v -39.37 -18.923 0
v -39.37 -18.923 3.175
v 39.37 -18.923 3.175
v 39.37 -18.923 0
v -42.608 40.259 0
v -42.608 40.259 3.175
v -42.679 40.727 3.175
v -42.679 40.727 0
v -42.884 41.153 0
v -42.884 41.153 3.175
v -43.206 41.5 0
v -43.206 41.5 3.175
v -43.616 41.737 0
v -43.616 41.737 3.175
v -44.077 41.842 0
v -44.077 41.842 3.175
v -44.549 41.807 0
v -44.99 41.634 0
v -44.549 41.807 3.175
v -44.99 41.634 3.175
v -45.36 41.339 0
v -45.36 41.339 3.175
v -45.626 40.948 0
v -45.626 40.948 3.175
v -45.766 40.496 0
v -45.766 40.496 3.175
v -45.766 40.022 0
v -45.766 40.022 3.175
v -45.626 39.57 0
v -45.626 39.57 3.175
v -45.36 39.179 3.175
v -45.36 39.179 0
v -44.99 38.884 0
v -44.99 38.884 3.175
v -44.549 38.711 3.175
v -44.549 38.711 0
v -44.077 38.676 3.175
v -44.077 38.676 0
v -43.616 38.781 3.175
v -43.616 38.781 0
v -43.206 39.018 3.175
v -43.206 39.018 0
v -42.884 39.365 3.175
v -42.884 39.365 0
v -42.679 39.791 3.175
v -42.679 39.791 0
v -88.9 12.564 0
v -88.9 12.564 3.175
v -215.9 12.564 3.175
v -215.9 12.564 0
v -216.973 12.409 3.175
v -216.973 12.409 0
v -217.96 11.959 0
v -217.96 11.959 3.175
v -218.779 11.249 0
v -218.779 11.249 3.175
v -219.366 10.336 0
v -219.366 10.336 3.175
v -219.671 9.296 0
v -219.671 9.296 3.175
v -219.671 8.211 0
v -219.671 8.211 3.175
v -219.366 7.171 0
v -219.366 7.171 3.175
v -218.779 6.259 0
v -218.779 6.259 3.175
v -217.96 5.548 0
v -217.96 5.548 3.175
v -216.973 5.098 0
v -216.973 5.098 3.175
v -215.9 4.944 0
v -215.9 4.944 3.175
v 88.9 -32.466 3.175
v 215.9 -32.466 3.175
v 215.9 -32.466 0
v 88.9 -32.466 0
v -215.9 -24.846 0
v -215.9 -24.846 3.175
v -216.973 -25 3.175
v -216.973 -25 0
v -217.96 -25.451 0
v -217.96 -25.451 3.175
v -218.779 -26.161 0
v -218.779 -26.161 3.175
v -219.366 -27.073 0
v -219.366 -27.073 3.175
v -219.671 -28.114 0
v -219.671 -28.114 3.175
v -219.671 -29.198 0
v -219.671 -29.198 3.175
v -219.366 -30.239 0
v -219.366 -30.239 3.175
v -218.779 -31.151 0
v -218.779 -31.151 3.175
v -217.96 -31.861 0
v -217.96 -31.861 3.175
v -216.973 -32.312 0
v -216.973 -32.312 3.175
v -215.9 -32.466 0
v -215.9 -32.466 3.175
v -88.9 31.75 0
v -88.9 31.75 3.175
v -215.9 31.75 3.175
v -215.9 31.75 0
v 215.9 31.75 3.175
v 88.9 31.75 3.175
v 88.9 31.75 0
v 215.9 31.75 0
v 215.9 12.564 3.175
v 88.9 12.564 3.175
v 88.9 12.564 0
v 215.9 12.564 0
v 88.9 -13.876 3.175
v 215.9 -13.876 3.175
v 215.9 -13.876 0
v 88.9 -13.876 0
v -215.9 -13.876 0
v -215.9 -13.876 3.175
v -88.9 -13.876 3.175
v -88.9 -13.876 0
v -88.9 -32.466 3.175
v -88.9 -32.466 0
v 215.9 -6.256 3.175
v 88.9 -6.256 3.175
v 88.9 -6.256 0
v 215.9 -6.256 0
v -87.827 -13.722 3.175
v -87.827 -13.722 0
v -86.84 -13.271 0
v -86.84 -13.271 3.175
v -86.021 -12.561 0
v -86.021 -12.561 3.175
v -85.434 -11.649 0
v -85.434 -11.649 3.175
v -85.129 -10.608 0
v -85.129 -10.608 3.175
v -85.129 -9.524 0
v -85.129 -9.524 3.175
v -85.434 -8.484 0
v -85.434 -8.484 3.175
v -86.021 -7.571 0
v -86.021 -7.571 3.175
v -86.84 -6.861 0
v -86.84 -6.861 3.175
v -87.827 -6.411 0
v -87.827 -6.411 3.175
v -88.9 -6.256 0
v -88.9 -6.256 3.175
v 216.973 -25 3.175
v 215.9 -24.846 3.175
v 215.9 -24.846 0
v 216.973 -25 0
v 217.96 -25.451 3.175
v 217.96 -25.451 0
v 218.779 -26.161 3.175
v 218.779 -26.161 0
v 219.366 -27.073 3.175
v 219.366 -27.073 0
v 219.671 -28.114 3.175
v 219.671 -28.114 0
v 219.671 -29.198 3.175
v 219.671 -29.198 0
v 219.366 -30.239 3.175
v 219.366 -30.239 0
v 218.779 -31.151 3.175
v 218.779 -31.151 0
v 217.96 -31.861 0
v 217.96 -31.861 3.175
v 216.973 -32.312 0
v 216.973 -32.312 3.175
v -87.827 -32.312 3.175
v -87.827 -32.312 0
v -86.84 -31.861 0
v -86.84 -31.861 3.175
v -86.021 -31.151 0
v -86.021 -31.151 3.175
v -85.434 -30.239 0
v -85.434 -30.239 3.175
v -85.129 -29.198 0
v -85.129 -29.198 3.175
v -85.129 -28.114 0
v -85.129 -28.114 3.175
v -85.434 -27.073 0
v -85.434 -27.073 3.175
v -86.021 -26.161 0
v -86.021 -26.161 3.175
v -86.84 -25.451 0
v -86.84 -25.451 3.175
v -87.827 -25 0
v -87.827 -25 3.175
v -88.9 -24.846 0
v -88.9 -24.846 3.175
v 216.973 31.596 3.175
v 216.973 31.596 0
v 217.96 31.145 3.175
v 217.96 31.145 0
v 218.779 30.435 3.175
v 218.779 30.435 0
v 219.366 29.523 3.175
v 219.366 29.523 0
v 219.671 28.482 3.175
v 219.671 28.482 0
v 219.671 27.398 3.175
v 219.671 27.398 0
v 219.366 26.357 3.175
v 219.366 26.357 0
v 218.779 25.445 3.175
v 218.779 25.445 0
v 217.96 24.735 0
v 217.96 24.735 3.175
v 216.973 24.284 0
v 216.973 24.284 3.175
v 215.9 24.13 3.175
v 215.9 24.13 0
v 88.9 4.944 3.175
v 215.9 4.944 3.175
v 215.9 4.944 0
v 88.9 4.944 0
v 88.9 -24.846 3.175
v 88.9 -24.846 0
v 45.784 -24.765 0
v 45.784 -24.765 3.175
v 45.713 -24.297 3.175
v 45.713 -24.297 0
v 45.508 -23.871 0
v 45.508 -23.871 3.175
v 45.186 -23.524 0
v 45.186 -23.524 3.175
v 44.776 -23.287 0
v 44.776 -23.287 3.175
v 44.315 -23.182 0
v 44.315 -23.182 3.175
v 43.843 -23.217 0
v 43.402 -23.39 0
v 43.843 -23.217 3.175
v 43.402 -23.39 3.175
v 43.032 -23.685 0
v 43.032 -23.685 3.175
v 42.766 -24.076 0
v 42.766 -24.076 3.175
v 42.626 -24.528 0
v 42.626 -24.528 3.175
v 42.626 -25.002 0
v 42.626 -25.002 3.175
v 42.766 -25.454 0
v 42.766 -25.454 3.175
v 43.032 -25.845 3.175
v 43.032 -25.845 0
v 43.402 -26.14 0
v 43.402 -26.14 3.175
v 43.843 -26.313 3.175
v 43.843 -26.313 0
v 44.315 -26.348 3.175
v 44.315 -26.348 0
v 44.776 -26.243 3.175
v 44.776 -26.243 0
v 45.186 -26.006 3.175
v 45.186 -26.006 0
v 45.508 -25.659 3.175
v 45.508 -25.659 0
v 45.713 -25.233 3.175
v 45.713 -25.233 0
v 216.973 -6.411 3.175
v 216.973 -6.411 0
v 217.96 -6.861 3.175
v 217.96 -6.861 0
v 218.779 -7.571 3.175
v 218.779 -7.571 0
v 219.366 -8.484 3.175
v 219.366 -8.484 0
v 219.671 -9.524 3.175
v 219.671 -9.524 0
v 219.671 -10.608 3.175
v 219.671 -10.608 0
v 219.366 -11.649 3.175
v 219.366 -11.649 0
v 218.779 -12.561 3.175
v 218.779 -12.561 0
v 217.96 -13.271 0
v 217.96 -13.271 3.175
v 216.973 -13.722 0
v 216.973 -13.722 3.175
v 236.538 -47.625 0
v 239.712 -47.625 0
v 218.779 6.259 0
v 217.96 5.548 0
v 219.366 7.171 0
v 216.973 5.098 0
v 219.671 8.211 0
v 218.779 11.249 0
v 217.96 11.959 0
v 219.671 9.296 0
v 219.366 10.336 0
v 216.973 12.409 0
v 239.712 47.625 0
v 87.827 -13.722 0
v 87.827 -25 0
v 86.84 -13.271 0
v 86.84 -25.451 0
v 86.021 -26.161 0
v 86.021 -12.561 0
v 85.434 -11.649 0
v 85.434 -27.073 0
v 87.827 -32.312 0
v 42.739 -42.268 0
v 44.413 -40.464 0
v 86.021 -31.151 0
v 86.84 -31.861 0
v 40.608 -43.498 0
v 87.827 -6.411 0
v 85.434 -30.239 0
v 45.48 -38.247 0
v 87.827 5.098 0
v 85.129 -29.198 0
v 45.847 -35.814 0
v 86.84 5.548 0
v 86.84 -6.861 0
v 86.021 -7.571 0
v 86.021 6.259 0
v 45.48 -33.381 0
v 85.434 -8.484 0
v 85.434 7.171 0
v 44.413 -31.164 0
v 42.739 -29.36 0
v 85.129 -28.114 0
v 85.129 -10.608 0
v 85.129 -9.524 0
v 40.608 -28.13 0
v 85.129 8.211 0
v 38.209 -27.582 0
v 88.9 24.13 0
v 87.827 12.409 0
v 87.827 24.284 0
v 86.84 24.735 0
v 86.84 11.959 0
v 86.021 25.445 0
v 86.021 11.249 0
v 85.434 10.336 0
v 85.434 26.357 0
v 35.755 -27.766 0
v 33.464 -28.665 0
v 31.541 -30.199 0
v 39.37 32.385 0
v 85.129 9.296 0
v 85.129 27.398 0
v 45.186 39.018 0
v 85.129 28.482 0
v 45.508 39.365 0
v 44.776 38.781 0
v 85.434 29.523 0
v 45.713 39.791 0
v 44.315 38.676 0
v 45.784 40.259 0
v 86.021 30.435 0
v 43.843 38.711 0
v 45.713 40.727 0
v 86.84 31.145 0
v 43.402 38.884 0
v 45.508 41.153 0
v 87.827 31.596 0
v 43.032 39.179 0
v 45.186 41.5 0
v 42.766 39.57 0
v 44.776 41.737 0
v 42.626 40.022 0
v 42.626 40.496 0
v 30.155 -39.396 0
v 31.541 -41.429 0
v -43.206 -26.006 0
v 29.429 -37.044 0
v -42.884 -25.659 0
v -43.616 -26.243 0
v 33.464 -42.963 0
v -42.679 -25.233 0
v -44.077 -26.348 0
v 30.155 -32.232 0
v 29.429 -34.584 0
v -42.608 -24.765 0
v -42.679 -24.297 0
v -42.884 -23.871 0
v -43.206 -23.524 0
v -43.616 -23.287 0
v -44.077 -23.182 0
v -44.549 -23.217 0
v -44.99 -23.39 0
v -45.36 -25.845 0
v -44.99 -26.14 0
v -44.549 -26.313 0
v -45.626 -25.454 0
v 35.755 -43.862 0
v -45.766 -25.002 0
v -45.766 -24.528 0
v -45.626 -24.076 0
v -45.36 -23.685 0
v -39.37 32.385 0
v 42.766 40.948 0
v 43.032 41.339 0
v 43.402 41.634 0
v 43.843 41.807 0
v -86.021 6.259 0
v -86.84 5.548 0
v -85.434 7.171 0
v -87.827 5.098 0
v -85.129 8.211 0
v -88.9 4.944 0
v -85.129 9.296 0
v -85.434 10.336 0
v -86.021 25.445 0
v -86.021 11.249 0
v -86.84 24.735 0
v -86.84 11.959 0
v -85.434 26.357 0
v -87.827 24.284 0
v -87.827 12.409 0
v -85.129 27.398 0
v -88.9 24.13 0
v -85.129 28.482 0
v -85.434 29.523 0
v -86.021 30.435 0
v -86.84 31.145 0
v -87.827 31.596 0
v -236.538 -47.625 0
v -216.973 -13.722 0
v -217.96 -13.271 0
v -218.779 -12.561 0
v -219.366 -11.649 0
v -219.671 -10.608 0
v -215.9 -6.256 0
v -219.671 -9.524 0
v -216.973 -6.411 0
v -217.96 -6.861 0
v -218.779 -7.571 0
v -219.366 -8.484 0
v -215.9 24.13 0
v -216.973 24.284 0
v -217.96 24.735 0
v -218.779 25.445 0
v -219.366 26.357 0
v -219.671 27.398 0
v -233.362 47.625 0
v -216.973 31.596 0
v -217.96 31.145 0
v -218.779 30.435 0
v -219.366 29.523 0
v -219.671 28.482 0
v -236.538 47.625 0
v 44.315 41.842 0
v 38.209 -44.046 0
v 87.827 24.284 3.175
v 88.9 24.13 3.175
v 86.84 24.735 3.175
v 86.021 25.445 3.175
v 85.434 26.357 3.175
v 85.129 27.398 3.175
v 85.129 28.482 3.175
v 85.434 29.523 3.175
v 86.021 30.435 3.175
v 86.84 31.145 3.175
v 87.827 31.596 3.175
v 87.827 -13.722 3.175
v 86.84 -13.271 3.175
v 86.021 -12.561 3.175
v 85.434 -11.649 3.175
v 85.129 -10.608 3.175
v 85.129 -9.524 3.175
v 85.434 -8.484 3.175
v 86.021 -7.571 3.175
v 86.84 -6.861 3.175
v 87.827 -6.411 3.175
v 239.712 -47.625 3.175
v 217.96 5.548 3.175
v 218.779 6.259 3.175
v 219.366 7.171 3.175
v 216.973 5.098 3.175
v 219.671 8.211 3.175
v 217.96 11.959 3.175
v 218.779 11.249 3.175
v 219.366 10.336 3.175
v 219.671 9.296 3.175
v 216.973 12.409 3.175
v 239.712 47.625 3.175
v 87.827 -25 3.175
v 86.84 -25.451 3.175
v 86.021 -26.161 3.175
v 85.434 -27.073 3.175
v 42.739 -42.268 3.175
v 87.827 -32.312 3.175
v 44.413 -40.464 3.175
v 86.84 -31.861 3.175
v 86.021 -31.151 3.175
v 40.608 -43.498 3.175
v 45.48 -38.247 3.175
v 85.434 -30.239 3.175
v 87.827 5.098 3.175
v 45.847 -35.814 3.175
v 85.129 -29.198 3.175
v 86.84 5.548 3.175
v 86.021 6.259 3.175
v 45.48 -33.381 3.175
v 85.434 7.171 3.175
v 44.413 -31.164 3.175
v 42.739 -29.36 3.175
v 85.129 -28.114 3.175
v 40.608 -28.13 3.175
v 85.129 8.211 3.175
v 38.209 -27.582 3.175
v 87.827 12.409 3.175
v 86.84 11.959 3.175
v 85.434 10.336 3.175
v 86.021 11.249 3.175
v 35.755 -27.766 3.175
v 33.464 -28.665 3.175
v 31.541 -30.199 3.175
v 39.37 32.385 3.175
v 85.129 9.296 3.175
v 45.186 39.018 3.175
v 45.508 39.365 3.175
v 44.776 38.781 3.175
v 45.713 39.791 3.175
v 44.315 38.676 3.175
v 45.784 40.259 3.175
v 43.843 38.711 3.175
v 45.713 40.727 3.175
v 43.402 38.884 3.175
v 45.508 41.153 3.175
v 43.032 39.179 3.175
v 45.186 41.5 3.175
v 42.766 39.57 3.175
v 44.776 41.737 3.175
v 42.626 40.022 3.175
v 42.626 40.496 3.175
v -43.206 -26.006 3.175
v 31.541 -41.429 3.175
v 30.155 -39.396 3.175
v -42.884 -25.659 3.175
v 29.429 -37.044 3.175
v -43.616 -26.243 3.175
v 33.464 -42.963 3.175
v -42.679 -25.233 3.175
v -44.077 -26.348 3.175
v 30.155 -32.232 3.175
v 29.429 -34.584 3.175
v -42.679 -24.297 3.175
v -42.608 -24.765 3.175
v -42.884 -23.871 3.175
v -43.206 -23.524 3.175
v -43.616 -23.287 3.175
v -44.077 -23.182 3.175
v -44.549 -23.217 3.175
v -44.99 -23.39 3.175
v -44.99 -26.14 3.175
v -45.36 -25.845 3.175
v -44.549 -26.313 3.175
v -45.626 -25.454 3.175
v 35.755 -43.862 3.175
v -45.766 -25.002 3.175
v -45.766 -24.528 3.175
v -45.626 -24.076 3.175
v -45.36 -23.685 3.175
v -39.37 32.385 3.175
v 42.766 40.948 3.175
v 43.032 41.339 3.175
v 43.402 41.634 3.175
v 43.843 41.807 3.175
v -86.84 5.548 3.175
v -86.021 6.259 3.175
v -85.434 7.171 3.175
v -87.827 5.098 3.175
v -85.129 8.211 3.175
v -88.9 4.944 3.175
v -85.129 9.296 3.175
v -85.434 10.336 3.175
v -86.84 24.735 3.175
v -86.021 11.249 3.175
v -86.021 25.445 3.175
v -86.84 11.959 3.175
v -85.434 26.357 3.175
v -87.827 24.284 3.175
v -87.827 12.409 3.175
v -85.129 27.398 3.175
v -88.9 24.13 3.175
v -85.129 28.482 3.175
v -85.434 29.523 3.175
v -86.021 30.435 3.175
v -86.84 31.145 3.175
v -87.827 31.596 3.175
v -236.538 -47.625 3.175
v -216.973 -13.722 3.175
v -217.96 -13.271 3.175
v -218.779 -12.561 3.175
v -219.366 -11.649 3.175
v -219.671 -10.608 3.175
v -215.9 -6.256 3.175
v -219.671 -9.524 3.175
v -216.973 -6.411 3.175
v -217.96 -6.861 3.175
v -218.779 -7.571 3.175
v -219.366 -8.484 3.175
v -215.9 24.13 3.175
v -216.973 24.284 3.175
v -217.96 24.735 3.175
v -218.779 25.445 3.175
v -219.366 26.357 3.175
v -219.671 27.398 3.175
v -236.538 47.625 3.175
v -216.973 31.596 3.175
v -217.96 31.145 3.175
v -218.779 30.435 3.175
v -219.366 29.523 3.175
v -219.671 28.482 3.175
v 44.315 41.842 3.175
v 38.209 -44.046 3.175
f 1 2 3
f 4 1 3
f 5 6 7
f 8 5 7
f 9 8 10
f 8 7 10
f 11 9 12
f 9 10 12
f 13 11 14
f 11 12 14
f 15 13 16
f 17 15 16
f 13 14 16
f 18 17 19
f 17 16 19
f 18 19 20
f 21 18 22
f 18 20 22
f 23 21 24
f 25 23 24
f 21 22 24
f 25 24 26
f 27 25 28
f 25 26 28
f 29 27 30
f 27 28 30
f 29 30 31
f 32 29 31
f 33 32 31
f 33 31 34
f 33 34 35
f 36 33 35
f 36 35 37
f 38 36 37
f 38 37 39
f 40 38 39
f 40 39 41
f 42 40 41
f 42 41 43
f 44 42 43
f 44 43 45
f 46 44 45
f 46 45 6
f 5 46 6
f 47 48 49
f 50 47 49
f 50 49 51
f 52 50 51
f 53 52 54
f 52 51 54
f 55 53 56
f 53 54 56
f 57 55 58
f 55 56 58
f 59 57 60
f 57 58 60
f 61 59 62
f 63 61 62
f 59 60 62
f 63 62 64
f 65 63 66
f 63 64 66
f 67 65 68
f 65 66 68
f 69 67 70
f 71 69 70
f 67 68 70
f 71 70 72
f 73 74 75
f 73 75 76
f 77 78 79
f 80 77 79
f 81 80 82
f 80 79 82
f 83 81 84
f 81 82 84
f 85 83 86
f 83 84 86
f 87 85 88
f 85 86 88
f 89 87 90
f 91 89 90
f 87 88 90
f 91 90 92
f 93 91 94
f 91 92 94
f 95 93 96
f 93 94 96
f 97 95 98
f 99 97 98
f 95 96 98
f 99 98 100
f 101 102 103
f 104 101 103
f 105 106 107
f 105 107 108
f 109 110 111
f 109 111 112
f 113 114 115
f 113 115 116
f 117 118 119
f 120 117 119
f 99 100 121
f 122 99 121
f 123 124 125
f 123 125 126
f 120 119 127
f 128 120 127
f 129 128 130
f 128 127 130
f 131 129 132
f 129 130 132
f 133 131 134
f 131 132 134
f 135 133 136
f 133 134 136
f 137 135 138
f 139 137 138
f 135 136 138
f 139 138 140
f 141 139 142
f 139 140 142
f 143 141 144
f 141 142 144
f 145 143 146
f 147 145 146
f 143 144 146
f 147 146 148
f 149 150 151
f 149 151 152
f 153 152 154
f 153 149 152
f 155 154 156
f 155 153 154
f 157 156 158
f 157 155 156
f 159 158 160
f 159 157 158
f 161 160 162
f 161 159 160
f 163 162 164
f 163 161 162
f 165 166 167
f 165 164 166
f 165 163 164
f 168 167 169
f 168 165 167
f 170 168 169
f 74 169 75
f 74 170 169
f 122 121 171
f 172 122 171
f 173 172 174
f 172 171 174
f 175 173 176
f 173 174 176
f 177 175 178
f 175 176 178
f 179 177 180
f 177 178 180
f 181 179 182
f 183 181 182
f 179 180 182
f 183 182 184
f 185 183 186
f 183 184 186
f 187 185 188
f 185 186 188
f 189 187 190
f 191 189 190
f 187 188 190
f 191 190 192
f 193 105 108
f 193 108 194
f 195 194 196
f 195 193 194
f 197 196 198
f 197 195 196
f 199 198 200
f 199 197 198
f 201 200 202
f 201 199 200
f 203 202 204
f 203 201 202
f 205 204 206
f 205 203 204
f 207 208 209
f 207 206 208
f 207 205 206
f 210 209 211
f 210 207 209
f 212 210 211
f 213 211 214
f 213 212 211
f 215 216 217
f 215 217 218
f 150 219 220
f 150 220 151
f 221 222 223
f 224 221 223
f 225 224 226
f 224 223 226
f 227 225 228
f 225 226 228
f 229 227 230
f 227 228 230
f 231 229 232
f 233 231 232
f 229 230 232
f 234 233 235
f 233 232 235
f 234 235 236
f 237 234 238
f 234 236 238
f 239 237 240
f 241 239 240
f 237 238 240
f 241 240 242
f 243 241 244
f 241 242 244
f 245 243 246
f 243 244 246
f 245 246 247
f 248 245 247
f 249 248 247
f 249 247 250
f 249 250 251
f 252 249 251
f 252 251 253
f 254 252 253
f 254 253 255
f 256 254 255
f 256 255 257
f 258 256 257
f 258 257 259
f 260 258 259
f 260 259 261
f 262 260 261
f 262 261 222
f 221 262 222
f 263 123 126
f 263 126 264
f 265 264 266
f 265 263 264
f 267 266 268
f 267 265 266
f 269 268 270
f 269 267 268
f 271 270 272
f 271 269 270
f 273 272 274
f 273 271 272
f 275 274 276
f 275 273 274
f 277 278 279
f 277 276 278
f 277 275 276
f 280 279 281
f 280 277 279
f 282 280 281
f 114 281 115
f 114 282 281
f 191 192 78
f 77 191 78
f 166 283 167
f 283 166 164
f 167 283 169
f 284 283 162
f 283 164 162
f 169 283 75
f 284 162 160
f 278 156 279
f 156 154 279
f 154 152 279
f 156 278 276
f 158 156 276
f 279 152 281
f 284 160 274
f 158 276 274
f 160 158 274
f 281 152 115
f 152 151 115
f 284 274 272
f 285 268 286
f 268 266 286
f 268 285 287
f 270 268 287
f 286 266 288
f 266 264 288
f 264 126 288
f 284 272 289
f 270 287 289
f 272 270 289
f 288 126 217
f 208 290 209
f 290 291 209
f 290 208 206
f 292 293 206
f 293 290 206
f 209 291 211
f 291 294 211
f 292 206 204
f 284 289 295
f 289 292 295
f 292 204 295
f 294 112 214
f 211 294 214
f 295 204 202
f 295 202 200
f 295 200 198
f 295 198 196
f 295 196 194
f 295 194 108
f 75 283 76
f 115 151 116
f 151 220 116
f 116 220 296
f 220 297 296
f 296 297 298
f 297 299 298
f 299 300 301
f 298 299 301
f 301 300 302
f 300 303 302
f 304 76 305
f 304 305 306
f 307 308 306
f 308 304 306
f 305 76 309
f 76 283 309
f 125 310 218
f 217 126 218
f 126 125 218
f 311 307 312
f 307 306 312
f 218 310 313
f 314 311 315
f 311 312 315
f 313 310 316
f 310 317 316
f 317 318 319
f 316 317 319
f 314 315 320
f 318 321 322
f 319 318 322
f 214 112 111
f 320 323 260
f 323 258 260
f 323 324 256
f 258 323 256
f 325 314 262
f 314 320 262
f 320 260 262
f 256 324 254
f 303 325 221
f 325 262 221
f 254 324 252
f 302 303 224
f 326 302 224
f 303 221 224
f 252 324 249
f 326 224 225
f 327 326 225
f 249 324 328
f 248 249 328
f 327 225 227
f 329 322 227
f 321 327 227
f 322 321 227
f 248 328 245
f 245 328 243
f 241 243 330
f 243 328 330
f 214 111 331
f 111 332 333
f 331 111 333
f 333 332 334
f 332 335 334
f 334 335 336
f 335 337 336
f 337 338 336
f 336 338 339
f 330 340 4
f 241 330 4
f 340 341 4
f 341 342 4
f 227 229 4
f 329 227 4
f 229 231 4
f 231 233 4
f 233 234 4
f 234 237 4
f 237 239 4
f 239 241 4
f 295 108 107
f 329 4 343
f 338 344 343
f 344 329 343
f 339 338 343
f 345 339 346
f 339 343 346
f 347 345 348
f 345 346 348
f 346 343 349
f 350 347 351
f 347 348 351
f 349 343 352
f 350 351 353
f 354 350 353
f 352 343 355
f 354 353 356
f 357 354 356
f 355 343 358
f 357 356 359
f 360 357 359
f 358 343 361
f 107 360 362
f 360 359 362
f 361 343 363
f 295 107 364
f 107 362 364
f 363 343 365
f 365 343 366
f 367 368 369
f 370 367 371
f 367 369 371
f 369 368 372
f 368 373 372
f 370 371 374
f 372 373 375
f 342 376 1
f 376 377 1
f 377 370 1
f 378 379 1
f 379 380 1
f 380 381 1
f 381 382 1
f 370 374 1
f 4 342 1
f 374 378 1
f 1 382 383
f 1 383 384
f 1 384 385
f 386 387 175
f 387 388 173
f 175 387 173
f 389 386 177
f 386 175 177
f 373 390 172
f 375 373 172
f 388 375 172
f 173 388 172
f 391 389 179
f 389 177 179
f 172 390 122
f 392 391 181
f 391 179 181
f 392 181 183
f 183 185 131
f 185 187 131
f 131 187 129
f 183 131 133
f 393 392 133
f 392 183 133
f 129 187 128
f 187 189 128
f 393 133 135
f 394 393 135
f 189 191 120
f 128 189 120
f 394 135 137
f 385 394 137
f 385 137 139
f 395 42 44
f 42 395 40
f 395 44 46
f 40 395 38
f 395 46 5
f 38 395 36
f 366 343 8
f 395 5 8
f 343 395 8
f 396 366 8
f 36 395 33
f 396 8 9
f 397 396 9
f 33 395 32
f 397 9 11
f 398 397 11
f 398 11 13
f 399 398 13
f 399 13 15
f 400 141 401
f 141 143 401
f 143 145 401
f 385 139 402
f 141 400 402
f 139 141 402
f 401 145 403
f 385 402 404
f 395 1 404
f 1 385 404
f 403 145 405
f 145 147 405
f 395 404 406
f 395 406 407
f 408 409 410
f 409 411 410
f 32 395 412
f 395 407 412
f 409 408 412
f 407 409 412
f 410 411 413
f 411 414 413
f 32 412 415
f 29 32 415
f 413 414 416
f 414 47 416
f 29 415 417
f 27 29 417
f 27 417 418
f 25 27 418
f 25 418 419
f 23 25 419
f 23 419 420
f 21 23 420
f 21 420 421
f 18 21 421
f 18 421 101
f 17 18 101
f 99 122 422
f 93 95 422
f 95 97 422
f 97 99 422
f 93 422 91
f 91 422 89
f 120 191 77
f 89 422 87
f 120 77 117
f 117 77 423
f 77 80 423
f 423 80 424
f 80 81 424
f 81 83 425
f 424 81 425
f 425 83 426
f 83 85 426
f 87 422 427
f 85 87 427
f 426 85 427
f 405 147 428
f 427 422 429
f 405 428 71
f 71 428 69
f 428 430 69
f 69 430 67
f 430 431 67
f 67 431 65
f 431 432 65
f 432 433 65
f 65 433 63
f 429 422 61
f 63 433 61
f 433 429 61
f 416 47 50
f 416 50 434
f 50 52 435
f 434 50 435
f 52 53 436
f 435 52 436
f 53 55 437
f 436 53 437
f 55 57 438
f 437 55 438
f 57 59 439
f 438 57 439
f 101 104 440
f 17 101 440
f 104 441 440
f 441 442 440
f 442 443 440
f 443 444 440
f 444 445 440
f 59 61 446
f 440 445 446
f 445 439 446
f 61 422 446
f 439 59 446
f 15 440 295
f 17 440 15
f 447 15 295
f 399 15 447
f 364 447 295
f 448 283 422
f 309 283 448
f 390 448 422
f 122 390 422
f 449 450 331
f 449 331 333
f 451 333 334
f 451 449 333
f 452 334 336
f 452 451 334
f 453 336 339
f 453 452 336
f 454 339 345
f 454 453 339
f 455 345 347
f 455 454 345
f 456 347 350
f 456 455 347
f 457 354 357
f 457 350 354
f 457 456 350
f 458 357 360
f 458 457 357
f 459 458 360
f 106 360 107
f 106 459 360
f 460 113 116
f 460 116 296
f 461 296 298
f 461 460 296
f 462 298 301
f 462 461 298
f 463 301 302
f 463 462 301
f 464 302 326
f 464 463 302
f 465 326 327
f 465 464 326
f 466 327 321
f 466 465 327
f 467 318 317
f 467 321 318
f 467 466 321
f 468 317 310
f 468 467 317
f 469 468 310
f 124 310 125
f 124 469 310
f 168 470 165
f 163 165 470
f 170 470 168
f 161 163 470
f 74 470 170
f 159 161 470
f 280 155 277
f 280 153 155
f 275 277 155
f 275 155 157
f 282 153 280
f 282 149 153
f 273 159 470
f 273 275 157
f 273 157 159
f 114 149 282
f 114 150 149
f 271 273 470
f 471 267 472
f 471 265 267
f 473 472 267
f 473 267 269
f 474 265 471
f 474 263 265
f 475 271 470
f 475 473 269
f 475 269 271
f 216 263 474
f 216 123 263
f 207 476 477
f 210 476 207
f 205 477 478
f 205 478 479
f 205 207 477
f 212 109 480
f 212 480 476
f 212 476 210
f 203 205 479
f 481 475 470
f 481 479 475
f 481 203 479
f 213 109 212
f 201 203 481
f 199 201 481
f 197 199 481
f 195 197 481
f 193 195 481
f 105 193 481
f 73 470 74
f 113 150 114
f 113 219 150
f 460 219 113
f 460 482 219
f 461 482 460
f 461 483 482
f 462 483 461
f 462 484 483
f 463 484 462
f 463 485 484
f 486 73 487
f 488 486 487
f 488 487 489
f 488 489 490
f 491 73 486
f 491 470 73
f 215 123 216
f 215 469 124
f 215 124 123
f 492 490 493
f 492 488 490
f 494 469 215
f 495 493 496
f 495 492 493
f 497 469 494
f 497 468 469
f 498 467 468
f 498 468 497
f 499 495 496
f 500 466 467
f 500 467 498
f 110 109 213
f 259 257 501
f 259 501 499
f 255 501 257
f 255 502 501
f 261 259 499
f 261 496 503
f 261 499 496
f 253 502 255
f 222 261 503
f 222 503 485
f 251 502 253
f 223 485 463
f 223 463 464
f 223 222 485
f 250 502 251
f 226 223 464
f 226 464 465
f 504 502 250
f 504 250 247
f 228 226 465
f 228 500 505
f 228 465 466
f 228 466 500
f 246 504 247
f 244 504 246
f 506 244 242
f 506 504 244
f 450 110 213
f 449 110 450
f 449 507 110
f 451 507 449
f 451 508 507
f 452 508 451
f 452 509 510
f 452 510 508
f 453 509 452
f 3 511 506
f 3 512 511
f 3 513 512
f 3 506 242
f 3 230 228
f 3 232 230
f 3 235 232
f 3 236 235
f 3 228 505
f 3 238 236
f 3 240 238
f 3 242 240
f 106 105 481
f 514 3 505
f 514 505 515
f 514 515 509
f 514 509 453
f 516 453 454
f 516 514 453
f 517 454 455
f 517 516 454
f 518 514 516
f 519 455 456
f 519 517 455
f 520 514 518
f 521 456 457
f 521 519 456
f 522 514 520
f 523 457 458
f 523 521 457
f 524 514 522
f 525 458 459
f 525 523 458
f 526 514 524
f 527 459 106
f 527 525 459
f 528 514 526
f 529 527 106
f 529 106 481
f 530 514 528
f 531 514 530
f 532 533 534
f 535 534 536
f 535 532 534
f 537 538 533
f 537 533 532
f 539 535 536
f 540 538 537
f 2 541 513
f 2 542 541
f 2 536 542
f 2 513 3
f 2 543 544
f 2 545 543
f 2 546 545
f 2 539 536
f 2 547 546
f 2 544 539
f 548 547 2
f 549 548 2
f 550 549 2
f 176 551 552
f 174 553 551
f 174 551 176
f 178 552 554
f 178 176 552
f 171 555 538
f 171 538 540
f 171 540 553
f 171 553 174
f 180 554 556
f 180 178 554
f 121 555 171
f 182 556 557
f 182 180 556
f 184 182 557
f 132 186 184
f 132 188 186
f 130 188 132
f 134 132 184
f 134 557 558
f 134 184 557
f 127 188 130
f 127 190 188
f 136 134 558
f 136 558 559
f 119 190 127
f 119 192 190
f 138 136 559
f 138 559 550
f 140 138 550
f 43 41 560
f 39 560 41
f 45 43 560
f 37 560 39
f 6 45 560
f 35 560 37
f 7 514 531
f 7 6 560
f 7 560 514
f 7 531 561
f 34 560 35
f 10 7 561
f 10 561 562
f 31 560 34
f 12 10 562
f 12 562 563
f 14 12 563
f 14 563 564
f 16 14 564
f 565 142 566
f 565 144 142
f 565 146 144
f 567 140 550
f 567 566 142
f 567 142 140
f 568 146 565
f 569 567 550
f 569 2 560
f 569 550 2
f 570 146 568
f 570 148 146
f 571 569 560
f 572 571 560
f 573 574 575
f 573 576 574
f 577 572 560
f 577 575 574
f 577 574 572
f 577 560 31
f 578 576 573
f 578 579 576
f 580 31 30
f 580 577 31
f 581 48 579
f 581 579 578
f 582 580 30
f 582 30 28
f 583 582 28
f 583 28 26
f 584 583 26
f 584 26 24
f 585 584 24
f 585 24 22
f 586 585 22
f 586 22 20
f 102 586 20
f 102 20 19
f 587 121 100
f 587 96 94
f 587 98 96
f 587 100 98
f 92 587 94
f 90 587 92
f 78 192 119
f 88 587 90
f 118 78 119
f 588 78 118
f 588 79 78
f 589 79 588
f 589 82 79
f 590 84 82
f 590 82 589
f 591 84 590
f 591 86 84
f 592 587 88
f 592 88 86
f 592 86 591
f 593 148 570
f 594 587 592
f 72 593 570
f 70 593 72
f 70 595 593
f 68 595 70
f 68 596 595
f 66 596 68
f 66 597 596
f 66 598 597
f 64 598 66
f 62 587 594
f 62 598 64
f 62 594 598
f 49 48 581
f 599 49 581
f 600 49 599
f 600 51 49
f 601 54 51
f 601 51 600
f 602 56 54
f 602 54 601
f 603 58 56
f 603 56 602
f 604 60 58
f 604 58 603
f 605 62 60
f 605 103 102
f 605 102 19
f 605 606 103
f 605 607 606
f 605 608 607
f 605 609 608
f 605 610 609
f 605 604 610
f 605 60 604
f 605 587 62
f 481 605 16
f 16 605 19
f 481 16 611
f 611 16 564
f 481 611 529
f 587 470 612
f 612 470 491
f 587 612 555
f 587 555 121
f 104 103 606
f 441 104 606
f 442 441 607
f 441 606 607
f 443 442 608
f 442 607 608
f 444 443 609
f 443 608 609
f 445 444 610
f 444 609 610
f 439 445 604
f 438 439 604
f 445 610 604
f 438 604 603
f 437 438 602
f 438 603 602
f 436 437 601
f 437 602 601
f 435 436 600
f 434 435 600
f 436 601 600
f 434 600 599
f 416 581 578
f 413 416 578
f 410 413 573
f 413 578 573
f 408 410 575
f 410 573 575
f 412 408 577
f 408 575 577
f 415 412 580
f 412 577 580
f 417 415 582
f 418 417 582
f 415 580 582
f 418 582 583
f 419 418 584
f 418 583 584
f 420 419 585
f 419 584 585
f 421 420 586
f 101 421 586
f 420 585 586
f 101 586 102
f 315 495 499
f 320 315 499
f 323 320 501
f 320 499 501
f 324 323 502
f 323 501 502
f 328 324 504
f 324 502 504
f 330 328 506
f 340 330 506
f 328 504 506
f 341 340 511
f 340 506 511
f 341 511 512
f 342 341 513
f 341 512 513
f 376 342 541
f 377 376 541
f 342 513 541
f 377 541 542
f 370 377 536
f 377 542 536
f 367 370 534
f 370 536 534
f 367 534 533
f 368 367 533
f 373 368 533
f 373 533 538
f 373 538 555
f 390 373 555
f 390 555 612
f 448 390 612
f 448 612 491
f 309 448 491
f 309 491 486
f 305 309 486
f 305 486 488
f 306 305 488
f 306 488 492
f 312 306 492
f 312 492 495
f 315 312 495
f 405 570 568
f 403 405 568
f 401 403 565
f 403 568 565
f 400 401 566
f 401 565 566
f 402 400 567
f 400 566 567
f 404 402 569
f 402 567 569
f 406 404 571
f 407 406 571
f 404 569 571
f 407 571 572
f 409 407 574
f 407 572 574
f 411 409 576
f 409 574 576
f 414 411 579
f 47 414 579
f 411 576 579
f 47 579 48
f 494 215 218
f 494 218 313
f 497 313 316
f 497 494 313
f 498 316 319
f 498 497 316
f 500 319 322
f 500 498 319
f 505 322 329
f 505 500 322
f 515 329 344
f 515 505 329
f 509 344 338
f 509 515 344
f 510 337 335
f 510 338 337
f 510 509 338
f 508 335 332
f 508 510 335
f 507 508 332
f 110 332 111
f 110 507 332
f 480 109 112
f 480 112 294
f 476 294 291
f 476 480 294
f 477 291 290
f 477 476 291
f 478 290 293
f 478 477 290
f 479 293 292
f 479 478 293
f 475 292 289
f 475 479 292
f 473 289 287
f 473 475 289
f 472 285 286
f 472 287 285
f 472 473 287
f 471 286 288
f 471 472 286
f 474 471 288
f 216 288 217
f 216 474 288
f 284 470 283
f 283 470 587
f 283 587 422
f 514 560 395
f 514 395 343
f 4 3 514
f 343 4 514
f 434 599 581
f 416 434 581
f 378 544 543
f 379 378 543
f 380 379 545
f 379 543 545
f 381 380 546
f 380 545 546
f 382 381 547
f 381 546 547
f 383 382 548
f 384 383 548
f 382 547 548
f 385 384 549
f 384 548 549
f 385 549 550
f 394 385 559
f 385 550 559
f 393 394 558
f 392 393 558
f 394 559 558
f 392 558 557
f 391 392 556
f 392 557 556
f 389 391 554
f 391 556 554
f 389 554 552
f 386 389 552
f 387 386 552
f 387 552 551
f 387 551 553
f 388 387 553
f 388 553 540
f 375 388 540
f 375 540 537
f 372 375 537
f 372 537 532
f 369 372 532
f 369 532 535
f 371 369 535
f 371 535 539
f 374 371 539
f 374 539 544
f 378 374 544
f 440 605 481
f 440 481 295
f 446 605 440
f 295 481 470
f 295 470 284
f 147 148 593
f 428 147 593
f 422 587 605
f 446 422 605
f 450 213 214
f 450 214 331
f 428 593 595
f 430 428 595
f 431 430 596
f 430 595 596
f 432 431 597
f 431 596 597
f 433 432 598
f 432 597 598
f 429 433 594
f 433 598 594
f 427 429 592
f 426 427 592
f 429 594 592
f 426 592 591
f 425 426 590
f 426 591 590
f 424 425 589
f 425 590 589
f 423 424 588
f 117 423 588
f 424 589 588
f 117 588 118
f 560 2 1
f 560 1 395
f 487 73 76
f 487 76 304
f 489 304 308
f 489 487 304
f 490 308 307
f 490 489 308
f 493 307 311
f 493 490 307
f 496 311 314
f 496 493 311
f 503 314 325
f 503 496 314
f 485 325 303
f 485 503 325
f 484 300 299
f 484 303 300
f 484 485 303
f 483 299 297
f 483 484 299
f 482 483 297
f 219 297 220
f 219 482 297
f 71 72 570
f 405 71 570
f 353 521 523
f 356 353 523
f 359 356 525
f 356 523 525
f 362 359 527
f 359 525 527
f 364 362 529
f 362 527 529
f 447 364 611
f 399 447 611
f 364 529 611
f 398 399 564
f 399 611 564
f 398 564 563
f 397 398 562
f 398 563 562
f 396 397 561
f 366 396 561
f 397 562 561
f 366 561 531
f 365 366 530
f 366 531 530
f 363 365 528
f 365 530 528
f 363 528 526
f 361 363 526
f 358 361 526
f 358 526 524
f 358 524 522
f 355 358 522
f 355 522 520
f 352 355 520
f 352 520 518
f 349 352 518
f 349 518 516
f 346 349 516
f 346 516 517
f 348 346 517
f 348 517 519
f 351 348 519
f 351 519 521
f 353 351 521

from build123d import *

# Parameters (mm, degrees)
SKETCH1_W           = 473.075
SKETCH1_H           = 95.25
BOSS_EXTRUDE1_DEPTH = 3.175
SKETCH3_W           = 78.74
SKETCH3_H           = 51.308
CUT_EXTRUDE2_DEPTH  = 242.305221983
SKETCH4_R           = 8.255
CUT_EXTRUDE3_DEPTH  = 242.305221983
SKETCH5_R           = 1.5875
CUT_EXTRUDE4_DEPTH  = 242.305221983
SKETCH6_W           = 3.175
SKETCH6_H           = 95.25
BOSS_EXTRUDE2_DEPTH = 371.948016105
SKETCH7_R           = 3.81
SKETCH7_W           = 50.8
SKETCH7_H           = 73.025
CUT_EXTRUDE5_DEPTH  = 381
CUT_EXTRUDE6_DEPTH  = 381
SKETCH12_W          = 371.948016105
SKETCH12_H          = 95.25
CUT_EXTRUDE7_DEPTH  = 54.356
SKETCH13_W          = 3.175
SKETCH13_H          = 95.25
BOSS_EXTRUDE3_DEPTH = 3.175


with BuildPart() as part:
    # Sketch1 → Boss-Extrude1 (new body)
    with BuildSketch(Plane.XY):
        Rectangle(SKETCH1_W, SKETCH1_H)
    extrude(amount=BOSS_EXTRUDE1_DEPTH)

    # Sketch3 → Cut-Extrude2 (cut, through all)
    with BuildSketch(Plane.XY.offset(3.175)):
        with Locations((0, 6.731)):
            Rectangle(SKETCH3_W, SKETCH3_H)
    extrude(amount=-CUT_EXTRUDE2_DEPTH, mode=Mode.SUBTRACT)

    # Sketch4 → Cut-Extrude3 (cut, through all)
    with BuildSketch(Plane.XY.offset(3.175)):
        with Locations((37.592, -35.814)):
            Circle(SKETCH4_R)
    extrude(amount=-CUT_EXTRUDE3_DEPTH, mode=Mode.SUBTRACT)

    # Sketch5 → Cut-Extrude4 (cut, through all)
    with BuildSketch(Plane.XY.offset(3.175)):
        with Locations((44.196, 40.259)):
            Circle(SKETCH5_R)
        with Locations((44.196, -24.765)):
            Circle(SKETCH5_R)
        with Locations((-44.196, -24.765)):
            Circle(SKETCH5_R)
        with Locations((-44.196, 40.259)):
            Circle(SKETCH5_R)
    extrude(amount=-CUT_EXTRUDE4_DEPTH, mode=Mode.SUBTRACT)

    # Sketch6 → Boss-Extrude2 (add)
    with BuildSketch(Plane(origin=(0, 0, 0), x_dir=(-1, 0, 0), z_dir=(0, 0, -1))):
        with Locations((234.95, 0)):
            Rectangle(SKETCH6_W, SKETCH6_H)
    extrude(amount=BOSS_EXTRUDE2_DEPTH)

    # Sketch7 → Cut-Extrude5 (cut)
    with BuildSketch(Plane.ZY.offset(236.5375)):
        with Locations((-248.250016105, -28.575)):
            Circle(SKETCH7_R)
        with Locations((-308.448016105, -7.9375)):
            Rectangle(SKETCH7_W, SKETCH7_H)
    extrude(amount=-CUT_EXTRUDE5_DEPTH, mode=Mode.SUBTRACT)

    # Sketch8 → Cut-Extrude6 (cut)
    with BuildSketch(Plane.XY.offset(3.175)):
        with BuildLine():
            Line((215.9, 31.75), (88.9, 31.75))
            ThreePointArc((88.9, 31.75), (85.09, 27.94), (88.9, 24.13))
            Line((88.9, 24.13), (215.9, 24.13))
            ThreePointArc((215.9, 24.13), (219.71, 27.94), (215.9, 31.75))
        make_face()
        with BuildLine():
            Line((215.9, 12.563594852), (88.9, 12.563594852))
            ThreePointArc((88.9, 12.563594852), (85.09, 8.753594852), (88.9, 4.943594852))
            Line((88.9, 4.943594852), (215.9, 4.943594852))
            ThreePointArc((215.9, 4.943594852), (219.71, 8.753594852), (215.9, 12.563594852))
        make_face()
        with BuildLine():
            Line((215.9, -6.256272006), (88.9, -6.256272006))
            ThreePointArc((88.9, -6.256272006), (85.09, -10.066272006), (88.9, -13.876272006))
            Line((88.9, -13.876272006), (215.9, -13.876272006))
            ThreePointArc((215.9, -13.876272006), (219.71, -10.066272006), (215.9, -6.256272006))
        make_face()
        with BuildLine():
            Line((215.9, -24.84600572), (88.9, -24.84600572))
            ThreePointArc((88.9, -24.84600572), (85.09, -28.65600572), (88.9, -32.46600572))
            Line((88.9, -32.46600572), (215.9, -32.46600572))
            ThreePointArc((215.9, -32.46600572), (219.71, -28.65600572), (215.9, -24.84600572))
        make_face()
        with BuildLine():
            ThreePointArc((-88.9, -32.46600572), (-85.09, -28.65600572), (-88.9, -24.84600572))
            Line((-88.9, -24.84600572), (-215.9, -24.84600572))
            ThreePointArc((-215.9, -24.84600572), (-219.71, -28.65600572), (-215.9, -32.46600572))
            Line((-215.9, -32.46600572), (-88.9, -32.46600572))
        make_face()
        with BuildLine():
            ThreePointArc((-88.9, -13.876272006), (-85.09, -10.066272006), (-88.9, -6.256272006))
            Line((-88.9, -6.256272006), (-215.9, -6.256272006))
            ThreePointArc((-215.9, -6.256272006), (-219.71, -10.066272006), (-215.9, -13.876272006))
            Line((-215.9, -13.876272006), (-88.9, -13.876272006))
        make_face()
        with BuildLine():
            ThreePointArc((-88.9, 4.943594852), (-85.09, 8.753594852), (-88.9, 12.563594852))
            Line((-88.9, 12.563594852), (-215.9, 12.563594852))
            ThreePointArc((-215.9, 12.563594852), (-219.71, 8.753594852), (-215.9, 4.943594852))
            Line((-215.9, 4.943594852), (-88.9, 4.943594852))
        make_face()
        with BuildLine():
            ThreePointArc((-88.9, 24.13), (-85.09, 27.94), (-88.9, 31.75))
            Line((-88.9, 31.75), (-215.9, 31.75))
            ThreePointArc((-215.9, 31.75), (-219.71, 27.94), (-215.9, 24.13))
            Line((-215.9, 24.13), (-88.9, 24.13))
        make_face()
    extrude(amount=-CUT_EXTRUDE6_DEPTH, mode=Mode.SUBTRACT)

    # Sketch12 → Cut-Extrude7 (cut)
    with BuildSketch(Plane(origin=(-233.3625, 0, 0), x_dir=(0, 0, -1), z_dir=(1, 0, 0))):
        with Locations((185.974008053, 0)):
            Rectangle(SKETCH12_W, SKETCH12_H)
    extrude(amount=-CUT_EXTRUDE7_DEPTH, mode=Mode.SUBTRACT)

    # Sketch13 → Boss-Extrude3 (add)
    with BuildSketch(Plane(origin=(236.5375, 0, 0), x_dir=(0, 0, -1), z_dir=(1, 0, 0))):
        with Locations((-1.5875, 0)):
            Rectangle(SKETCH13_W, SKETCH13_H)
    extrude(amount=BOSS_EXTRUDE3_DEPTH)


solid = part.part
